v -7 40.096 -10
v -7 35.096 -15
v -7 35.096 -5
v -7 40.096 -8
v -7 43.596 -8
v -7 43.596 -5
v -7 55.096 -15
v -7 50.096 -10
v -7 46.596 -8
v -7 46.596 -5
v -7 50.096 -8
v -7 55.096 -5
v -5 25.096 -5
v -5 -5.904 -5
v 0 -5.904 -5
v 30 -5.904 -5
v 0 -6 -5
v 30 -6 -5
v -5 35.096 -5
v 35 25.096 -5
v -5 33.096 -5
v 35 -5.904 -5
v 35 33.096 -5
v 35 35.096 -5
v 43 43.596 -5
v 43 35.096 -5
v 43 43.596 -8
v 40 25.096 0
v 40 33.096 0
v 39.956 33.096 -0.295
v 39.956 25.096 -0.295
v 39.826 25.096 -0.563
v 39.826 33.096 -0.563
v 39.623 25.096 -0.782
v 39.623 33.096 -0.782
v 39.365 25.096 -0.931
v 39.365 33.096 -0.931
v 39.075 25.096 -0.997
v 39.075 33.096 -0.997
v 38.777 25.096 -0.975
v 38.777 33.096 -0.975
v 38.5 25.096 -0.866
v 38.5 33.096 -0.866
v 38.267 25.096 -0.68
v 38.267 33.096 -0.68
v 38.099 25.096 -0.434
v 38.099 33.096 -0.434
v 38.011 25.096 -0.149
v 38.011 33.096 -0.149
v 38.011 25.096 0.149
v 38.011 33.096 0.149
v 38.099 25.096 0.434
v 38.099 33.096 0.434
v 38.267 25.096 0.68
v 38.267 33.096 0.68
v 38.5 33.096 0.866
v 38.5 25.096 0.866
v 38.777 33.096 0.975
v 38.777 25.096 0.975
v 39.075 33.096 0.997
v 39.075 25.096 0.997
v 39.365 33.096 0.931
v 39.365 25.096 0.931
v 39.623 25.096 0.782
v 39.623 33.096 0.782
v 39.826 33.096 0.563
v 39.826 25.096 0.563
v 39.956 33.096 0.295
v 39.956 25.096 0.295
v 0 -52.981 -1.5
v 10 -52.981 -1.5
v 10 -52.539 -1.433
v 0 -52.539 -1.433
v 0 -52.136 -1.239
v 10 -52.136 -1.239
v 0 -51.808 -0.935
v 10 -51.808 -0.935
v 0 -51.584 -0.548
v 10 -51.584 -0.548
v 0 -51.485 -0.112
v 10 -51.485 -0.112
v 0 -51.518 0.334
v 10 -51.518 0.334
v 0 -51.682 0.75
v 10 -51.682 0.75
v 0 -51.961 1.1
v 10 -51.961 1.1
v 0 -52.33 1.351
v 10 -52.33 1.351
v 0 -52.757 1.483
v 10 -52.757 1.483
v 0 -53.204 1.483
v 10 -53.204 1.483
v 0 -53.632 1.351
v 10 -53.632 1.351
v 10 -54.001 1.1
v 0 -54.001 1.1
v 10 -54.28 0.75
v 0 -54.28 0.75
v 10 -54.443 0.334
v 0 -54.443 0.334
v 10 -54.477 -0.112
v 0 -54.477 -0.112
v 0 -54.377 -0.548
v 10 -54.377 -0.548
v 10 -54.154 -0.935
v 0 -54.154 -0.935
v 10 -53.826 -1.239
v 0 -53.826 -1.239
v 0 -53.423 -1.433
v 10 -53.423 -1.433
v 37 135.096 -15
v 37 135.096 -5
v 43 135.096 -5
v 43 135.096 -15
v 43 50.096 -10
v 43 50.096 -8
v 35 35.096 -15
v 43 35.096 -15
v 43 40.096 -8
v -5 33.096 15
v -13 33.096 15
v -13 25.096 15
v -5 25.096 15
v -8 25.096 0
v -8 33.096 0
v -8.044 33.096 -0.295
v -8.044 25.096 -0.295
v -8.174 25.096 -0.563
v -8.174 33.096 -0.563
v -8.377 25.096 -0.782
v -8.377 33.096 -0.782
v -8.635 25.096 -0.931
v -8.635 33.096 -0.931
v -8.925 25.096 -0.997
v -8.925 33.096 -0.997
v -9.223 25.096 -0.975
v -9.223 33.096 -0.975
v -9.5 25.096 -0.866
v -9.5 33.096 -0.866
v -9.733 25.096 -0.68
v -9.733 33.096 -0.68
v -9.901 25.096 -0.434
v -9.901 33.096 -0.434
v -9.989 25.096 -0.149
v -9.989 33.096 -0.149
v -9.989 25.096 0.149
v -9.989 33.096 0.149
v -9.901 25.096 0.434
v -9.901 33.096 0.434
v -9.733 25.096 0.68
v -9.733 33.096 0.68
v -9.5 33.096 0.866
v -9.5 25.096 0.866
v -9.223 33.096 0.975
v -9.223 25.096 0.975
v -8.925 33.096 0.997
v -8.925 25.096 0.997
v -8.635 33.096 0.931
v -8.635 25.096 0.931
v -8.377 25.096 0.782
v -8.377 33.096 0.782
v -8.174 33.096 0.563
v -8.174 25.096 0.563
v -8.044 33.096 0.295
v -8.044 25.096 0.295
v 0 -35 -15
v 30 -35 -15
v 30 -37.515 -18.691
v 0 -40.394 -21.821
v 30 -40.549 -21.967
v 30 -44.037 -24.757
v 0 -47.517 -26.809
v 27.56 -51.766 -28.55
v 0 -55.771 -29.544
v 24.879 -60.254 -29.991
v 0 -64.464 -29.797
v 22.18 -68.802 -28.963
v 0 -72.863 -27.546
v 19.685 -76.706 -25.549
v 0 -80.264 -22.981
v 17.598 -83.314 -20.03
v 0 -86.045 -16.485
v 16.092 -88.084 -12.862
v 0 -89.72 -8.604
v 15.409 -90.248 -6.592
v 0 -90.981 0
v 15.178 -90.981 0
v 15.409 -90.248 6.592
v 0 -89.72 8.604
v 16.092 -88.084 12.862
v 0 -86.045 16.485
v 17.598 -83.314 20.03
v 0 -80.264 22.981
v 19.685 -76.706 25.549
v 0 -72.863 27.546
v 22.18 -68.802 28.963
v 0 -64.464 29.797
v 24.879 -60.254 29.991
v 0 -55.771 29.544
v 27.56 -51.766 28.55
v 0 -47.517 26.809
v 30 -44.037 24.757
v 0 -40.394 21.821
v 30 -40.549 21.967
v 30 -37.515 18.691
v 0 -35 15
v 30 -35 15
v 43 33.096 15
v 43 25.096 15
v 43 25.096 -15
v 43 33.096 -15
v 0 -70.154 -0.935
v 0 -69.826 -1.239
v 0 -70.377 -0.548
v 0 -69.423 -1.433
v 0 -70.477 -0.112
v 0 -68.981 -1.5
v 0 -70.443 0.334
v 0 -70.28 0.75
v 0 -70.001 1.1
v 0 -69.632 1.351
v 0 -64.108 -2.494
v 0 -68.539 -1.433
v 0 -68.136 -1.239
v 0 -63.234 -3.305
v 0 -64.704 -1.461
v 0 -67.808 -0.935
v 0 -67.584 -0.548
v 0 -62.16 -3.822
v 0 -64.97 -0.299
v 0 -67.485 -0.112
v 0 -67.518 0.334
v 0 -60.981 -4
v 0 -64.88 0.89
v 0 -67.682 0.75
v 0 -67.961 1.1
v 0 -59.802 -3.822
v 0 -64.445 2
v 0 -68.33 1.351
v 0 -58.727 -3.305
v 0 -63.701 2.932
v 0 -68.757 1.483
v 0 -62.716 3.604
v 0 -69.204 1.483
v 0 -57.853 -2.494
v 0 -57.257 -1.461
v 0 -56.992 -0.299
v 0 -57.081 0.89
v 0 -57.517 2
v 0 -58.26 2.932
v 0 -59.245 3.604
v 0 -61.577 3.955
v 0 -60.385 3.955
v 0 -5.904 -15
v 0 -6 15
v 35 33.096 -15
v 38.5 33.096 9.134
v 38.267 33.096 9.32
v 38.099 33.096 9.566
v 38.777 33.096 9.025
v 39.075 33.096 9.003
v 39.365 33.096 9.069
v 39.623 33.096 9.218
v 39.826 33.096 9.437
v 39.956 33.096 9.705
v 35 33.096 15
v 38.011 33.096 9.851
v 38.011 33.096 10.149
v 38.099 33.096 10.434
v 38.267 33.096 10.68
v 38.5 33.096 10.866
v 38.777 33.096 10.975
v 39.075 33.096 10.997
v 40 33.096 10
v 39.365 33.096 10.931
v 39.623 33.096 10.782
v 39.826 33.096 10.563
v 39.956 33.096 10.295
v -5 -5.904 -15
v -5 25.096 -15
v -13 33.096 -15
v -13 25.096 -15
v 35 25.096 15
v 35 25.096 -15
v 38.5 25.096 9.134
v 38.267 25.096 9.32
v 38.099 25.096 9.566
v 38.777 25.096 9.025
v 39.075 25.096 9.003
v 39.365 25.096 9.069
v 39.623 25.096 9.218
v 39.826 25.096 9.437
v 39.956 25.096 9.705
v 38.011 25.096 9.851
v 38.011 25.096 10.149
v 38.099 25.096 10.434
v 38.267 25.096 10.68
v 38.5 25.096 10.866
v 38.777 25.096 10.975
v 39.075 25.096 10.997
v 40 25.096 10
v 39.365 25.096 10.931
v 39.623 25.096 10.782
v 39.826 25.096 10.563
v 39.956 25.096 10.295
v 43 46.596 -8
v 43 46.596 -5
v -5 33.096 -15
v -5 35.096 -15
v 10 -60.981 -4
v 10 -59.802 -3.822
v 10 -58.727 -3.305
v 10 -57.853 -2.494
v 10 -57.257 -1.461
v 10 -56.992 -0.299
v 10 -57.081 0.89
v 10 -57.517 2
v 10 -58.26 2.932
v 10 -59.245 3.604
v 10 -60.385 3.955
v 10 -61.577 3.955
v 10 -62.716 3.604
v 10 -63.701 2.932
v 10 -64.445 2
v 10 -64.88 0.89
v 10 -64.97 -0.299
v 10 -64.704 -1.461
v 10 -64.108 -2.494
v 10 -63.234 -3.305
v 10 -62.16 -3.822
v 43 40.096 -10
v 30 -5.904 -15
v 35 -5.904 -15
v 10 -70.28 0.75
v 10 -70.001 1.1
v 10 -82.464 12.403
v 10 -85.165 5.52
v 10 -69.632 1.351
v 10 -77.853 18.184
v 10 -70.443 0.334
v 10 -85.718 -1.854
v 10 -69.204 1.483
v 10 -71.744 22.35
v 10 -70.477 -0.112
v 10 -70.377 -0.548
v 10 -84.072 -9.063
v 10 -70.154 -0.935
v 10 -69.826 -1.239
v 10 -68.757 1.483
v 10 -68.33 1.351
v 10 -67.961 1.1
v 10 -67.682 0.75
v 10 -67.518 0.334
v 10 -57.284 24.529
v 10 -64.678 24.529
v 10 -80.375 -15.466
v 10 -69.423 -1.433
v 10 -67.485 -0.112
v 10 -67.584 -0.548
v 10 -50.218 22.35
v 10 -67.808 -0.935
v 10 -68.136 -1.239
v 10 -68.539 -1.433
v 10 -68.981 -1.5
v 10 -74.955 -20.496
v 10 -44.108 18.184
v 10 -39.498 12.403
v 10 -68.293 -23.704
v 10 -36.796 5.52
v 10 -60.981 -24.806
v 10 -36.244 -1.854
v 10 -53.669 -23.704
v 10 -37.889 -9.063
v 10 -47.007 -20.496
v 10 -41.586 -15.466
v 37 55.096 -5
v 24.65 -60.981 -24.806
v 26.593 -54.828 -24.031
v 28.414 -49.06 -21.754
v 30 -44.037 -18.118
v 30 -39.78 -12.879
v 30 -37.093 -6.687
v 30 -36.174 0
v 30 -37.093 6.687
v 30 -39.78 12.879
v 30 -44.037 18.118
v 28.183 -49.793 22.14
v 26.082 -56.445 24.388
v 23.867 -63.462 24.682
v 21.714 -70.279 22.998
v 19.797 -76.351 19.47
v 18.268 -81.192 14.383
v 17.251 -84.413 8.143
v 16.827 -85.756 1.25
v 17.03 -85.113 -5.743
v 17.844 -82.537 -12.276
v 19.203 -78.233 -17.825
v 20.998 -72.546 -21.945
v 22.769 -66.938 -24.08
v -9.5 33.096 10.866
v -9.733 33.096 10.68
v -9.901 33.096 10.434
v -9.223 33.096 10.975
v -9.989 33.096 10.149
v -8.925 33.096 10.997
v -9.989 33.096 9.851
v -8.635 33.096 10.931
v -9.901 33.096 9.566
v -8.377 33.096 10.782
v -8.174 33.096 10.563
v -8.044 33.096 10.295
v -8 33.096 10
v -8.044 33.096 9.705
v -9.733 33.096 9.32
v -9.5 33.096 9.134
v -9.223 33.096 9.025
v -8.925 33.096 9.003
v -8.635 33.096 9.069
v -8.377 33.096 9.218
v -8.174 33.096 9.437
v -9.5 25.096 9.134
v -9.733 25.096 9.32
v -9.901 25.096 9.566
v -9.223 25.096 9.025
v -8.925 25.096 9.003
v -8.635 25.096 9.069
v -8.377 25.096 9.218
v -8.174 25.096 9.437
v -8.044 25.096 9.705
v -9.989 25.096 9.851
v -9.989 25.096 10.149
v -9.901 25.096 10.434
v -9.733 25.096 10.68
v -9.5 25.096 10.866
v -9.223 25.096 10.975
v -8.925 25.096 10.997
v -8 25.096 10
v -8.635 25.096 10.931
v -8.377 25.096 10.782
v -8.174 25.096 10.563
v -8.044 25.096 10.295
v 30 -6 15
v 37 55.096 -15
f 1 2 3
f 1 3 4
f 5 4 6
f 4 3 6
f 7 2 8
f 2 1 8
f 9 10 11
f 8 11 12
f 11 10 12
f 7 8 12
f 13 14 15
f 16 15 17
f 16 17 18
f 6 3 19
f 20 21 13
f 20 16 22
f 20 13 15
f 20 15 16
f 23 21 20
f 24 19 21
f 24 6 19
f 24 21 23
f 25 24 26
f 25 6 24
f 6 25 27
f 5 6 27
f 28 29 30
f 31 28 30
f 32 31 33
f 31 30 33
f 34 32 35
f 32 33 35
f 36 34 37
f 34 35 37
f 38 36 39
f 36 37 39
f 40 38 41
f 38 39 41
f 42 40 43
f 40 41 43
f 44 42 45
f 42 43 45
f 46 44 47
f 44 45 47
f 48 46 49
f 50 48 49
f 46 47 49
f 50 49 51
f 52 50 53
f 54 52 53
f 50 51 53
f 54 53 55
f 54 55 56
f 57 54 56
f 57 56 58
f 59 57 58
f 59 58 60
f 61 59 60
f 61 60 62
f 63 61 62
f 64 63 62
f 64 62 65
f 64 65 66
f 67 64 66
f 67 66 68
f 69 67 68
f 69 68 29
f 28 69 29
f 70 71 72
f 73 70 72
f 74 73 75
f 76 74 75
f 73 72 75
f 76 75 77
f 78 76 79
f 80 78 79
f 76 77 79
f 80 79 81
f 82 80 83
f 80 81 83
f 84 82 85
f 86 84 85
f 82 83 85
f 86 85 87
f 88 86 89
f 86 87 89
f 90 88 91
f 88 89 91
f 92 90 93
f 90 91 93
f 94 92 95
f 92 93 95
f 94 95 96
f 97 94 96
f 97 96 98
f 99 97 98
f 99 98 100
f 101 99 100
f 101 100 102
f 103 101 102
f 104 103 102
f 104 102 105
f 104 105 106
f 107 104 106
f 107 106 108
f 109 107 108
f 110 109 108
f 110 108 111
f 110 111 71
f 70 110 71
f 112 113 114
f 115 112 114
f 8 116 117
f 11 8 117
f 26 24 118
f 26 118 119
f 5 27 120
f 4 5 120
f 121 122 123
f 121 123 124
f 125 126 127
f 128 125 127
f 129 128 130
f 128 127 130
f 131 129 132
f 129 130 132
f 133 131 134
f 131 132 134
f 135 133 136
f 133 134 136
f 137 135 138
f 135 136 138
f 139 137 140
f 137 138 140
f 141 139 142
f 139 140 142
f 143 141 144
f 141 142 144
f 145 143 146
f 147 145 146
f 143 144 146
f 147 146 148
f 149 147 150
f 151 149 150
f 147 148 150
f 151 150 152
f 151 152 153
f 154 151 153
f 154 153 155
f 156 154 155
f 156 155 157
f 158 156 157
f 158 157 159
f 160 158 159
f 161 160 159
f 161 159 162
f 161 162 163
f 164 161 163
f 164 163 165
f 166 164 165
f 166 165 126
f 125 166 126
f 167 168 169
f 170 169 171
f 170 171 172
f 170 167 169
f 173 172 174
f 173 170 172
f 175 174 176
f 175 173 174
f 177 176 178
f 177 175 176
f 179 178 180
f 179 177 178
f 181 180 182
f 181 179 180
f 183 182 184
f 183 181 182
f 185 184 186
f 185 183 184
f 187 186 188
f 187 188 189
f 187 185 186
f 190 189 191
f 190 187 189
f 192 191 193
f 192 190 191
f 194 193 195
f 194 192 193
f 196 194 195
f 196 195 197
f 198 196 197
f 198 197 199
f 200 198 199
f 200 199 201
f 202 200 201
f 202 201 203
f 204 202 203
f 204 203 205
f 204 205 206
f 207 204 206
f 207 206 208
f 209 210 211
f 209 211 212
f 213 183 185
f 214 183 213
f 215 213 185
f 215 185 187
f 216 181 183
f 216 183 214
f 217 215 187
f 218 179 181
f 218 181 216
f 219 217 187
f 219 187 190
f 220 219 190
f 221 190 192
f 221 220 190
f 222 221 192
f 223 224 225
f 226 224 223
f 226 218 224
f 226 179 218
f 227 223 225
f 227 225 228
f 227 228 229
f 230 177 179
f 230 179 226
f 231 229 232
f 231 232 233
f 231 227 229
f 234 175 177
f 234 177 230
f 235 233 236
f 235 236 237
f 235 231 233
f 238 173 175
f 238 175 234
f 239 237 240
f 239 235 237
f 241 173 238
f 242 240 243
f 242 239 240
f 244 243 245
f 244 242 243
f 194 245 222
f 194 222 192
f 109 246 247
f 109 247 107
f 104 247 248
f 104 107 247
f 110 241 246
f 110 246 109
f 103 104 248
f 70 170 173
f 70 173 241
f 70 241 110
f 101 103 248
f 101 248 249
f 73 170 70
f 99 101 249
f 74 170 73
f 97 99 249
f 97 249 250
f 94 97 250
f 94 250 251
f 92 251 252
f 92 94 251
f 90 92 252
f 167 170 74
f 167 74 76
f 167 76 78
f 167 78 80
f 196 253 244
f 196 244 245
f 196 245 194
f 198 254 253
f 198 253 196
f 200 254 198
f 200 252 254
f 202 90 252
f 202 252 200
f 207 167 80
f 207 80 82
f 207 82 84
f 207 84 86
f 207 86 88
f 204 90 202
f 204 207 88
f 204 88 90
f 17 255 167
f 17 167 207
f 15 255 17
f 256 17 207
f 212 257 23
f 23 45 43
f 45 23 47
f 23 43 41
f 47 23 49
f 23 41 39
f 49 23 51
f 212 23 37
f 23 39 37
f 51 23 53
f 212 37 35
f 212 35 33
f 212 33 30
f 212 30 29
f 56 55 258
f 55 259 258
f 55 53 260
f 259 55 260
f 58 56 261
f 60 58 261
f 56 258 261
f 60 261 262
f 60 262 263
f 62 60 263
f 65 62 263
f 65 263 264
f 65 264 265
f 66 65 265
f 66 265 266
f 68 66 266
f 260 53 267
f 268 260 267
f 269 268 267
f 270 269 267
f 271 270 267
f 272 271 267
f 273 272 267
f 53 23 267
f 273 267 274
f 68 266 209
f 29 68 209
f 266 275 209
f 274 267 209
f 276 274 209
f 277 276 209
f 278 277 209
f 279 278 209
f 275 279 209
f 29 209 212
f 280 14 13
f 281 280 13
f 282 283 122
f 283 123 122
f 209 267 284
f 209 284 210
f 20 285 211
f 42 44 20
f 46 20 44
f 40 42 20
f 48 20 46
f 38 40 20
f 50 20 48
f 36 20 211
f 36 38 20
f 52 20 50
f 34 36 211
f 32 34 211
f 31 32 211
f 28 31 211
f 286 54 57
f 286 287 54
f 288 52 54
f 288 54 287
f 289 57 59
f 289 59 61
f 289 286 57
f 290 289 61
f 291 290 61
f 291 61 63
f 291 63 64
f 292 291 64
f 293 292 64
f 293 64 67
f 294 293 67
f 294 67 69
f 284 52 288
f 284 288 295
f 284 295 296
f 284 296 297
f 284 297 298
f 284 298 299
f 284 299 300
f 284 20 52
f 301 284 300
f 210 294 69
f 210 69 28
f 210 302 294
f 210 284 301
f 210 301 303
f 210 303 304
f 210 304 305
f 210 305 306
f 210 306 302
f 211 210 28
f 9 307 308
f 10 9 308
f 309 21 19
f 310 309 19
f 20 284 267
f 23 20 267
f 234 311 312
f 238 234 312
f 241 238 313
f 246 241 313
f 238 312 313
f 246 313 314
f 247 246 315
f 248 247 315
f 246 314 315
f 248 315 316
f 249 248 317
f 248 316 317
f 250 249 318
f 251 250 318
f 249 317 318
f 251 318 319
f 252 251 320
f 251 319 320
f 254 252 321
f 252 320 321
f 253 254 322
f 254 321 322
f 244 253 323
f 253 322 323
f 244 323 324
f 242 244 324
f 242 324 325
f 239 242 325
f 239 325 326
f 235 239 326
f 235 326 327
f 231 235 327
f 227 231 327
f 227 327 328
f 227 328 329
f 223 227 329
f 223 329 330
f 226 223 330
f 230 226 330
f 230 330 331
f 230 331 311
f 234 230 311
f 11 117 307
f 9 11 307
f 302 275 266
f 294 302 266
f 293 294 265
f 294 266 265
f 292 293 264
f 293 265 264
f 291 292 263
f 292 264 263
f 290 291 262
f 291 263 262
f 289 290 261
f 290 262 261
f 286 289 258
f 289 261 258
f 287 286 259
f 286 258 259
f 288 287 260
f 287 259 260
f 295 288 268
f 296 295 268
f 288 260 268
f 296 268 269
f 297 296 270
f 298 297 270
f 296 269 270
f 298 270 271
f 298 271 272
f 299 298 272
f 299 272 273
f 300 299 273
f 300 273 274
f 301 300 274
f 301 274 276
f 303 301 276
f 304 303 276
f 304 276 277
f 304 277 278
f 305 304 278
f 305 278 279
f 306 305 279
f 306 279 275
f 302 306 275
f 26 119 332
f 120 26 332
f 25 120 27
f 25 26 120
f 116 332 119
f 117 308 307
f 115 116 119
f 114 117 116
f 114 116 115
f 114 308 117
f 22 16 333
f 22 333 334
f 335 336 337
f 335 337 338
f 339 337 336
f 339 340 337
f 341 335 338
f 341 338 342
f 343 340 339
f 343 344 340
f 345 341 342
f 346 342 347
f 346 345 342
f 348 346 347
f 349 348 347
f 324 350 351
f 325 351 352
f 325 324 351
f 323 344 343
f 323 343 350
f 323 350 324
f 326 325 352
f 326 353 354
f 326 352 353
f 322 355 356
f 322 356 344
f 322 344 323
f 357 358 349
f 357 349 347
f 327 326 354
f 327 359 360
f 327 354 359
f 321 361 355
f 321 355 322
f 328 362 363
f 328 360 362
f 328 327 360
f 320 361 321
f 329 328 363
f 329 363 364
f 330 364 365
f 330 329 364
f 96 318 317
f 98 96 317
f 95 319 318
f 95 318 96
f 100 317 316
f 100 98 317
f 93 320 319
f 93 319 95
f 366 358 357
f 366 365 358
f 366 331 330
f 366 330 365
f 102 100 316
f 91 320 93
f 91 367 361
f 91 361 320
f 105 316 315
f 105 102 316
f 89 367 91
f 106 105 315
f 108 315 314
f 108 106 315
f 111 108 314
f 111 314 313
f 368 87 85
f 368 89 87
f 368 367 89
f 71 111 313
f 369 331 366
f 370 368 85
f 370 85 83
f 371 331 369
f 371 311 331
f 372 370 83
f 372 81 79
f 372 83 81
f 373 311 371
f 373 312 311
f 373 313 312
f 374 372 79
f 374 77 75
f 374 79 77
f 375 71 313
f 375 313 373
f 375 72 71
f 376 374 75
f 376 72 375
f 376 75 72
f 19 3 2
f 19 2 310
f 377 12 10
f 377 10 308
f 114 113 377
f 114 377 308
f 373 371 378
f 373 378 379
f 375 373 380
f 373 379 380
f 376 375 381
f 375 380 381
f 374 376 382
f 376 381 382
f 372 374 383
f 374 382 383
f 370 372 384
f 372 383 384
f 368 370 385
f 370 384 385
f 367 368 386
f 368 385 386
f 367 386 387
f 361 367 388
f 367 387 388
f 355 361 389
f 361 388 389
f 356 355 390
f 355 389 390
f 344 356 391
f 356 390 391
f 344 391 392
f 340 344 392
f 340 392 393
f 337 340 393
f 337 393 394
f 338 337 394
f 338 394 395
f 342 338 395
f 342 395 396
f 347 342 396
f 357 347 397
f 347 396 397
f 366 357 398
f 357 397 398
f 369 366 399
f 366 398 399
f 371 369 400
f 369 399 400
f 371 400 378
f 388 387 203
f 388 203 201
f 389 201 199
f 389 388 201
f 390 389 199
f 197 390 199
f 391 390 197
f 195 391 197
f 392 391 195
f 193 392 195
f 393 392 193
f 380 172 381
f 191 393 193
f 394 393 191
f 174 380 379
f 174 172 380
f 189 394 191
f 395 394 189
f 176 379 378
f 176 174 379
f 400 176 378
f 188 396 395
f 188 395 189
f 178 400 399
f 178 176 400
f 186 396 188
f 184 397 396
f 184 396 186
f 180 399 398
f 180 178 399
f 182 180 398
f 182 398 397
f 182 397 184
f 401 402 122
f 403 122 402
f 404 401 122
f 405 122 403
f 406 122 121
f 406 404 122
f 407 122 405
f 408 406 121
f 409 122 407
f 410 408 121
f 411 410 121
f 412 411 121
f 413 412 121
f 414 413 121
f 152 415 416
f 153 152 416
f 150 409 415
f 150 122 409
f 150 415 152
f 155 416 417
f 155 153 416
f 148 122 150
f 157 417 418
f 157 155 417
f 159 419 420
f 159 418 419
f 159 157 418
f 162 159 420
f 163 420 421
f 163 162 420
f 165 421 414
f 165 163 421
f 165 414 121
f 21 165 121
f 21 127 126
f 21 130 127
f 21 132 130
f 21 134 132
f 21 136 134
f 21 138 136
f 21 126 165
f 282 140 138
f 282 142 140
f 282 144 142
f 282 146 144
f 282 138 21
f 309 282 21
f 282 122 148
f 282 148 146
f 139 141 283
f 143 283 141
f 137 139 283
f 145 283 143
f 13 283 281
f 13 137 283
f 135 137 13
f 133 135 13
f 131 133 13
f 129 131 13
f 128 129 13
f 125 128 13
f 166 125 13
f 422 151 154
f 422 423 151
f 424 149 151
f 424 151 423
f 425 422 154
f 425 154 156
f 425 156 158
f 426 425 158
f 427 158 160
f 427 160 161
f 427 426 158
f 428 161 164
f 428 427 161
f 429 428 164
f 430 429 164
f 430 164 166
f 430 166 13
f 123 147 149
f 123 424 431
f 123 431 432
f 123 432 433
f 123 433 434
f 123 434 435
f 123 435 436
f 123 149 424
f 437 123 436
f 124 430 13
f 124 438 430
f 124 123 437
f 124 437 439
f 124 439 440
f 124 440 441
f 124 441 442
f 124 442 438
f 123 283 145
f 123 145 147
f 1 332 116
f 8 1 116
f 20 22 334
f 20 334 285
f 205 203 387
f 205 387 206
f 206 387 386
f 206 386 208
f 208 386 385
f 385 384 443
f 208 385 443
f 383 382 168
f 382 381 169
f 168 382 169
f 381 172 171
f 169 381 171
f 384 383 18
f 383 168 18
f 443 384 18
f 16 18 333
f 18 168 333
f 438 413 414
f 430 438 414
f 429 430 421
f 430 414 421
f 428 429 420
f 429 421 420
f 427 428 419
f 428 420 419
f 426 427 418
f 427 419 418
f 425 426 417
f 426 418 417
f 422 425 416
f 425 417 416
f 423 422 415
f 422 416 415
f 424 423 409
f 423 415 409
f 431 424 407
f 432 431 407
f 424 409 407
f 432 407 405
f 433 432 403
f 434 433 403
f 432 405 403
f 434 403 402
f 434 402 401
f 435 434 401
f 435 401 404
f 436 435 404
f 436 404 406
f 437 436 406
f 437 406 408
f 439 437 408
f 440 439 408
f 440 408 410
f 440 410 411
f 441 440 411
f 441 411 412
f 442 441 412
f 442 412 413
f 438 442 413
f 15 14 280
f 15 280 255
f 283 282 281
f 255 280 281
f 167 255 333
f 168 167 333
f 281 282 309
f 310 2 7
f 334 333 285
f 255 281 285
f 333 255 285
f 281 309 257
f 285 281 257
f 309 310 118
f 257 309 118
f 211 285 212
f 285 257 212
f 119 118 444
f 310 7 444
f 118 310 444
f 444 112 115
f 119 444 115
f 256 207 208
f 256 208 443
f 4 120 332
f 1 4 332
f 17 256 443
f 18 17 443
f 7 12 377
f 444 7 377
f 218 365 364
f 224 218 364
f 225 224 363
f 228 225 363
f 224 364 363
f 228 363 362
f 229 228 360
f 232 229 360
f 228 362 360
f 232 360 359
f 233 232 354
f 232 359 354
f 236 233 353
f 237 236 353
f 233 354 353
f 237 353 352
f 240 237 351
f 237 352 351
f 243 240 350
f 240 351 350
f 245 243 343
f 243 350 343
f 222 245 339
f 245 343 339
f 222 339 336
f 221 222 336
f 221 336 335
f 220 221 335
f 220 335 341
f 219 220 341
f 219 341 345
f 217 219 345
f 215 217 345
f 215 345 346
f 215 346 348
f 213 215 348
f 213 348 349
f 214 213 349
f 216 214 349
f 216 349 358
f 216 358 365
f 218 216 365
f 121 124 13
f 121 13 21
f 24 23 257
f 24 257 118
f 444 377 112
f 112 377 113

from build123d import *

# Parameters (mm, degrees)
BOSS_EXTRUDE1_DEPTH      = 30
CUT_EXTRUDE4_DEPTH       = 40
CUT_EXTRUDE4_DEPTH_BACK  = 40
BOSS_EXTRUDE2_DEPTH      = 15
BOSS_EXTRUDE2_DEPTH_BACK = 15
SKETCH7_W                = 30
SKETCH7_H                = 66.933951842
SKETCH12_W               = 30
SKETCH12_H               = 41
CUT_EXTRUDE7_DEPTH       = 20
SKETCH13_W               = 40
SKETCH13_H               = 41
BOSS_EXTRUDE4_DEPTH      = 10
BOSS_EXTRUDE5_DEPTH      = 20
BOSS_EXTRUDE5_DEPTH_BACK = 10
SKETCH15_W               = 8
SKETCH15_H               = 8
SKETCH17_R               = 1
CUT_EXTRUDE9_DEPTH       = 30
SKETCH18_R               = 24.806306278
CUT_EXTRUDE10_DEPTH      = 20
SKETCH19_R               = 4
SKETCH19_R_2             = 1.5
CUT_EXTRUDE11_DEPTH      = 30
SKETCH20_W               = 56
SKETCH20_H               = 100
BOSS_EXTRUDE6_DEPTH      = 10
SKETCH24_W               = 50
SKETCH24_H               = 80
CUT_EXTRUDE13_DEPTH      = 20
CUT_EXTRUDE14_DEPTH      = 70
SKETCH30_W               = 6
SKETCH30_H               = 20
CUT_EXTRUDE15_DEPTH      = 30


with BuildPart() as part:
    # Sketch2 → Boss-Extrude1 (new body)
    with BuildSketch(Plane(origin=(0, 0, 0), x_dir=(0, 0, -1), z_dir=(1, 0, 0))):
        with BuildLine():
            Line((-15, 35), (15, 35))
            Line((15, 35), (15, -35))
            ThreePointArc((15, -35), (0, -90.980762114), (-15, -35))
            Line((-15, -35), (-15, 35))
        make_face()
    extrude(amount=BOSS_EXTRUDE1_DEPTH)

    # Sketch6 → Cut-Extrude4 (cut, two sides: drawn at the far end of the back side and taken through both)
    with BuildSketch(Plane.XY.offset(-CUT_EXTRUDE4_DEPTH_BACK)):
        Polygon((15, 35), (30, -15.145060683), (30, -44.036502572), (15, -91.543130052), (48.566296189, -91.543130052), (48.566296189, 35), align=None)
    extrude(amount=CUT_EXTRUDE4_DEPTH + CUT_EXTRUDE4_DEPTH_BACK, mode=Mode.SUBTRACT)

    # Sketch7 → Boss-Extrude2 (add, two sides: drawn at the far end of the back side and taken through both)
    with BuildSketch(Plane.XY.offset(-BOSS_EXTRUDE2_DEPTH_BACK)):
        with Locations((15, 1.533024079)):
            Rectangle(SKETCH7_W, SKETCH7_H)
    extrude(amount=BOSS_EXTRUDE2_DEPTH + BOSS_EXTRUDE2_DEPTH_BACK)

    # Sketch12 → Cut-Extrude7 (cut)
    with BuildSketch(Plane.XY.offset(15)):
        with Locations((15, 14.5)):
            Rectangle(SKETCH12_W, SKETCH12_H)
    extrude(amount=-CUT_EXTRUDE7_DEPTH, mode=Mode.SUBTRACT)

    # Sketch13 → Boss-Extrude4 (add)
    with BuildSketch(Plane.XY.offset(-5)):
        with Locations((15, 14.596252504)):
            Rectangle(SKETCH13_W, SKETCH13_H)
    extrude(amount=-BOSS_EXTRUDE4_DEPTH)

    # Sketch15 → Boss-Extrude5 (add, two sides: drawn at the far end of the back side and taken through both)
    with BuildSketch(Plane.XY.offset(-5).offset(-BOSS_EXTRUDE5_DEPTH_BACK)):
        with Locations((39, 29.096252504)):
            Rectangle(SKETCH15_W, SKETCH15_H)
        with Locations((-9, 29.096252504)):
            Rectangle(SKETCH15_W, SKETCH15_H)
    extrude(amount=BOSS_EXTRUDE5_DEPTH + BOSS_EXTRUDE5_DEPTH_BACK)

    # Sketch17 → Cut-Extrude9 (cut)
    with BuildSketch(Plane(origin=(0, 33.096252504, 0), x_dir=(1, 0, 0), z_dir=(0, 1, 0))):
        with Locations((39, 0)):
            Circle(SKETCH17_R)
        with Locations((39, -10)):
            Circle(SKETCH17_R)
        with Locations((-9, 0)):
            Circle(SKETCH17_R)
        with Locations((-9, -10)):
            Circle(SKETCH17_R)
    extrude(amount=-CUT_EXTRUDE9_DEPTH, mode=Mode.SUBTRACT)

    # Sketch18 → Cut-Extrude10 (cut)
    with BuildSketch(Plane(origin=(30, 0, 0), x_dir=(0, 0, -1), z_dir=(1, 0, 0))):
        with Locations((0, -60.980762114)):
            Circle(SKETCH18_R)
    extrude(amount=-CUT_EXTRUDE10_DEPTH, mode=Mode.SUBTRACT)

    # Sketch19 → Cut-Extrude11 (cut)
    with BuildSketch(Plane(origin=(30, 0, 0), x_dir=(0, 0, -1), z_dir=(1, 0, 0))):
        with Locations((0, -60.980762114)):
            Circle(SKETCH19_R)
        with Locations((0, -52.980762114)):
            Circle(SKETCH19_R_2)
        with Locations((0, -68.980762114)):
            Circle(SKETCH19_R_2)
    extrude(amount=-CUT_EXTRUDE11_DEPTH, mode=Mode.SUBTRACT)

    # Sketch20 → Boss-Extrude6 (add)
    with BuildSketch(Plane.XY.offset(-5)):
        with Locations((15, 85.096252504)):
            Rectangle(SKETCH20_W, SKETCH20_H)
    extrude(amount=-BOSS_EXTRUDE6_DEPTH)

    # Sketch24 → Cut-Extrude13 (cut)
    with BuildSketch(Plane.XY.offset(-5)):
        with Locations((12, 95.096252504)):
            Rectangle(SKETCH24_W, SKETCH24_H)
    extrude(amount=-CUT_EXTRUDE13_DEPTH, mode=Mode.SUBTRACT)

    # Sketch25 → Cut-Extrude14 (cut)
    with BuildSketch(Plane(origin=(43, 0, 0), x_dir=(0, 0, -1), z_dir=(1, 0, 0))):
        Polygon((10, 50.096252504), (8, 50.096252504), (8, 46.596252504), (3.330307532, 46.596252504), (3.330307532, 43.596252504), (8, 43.596252504), (8, 40.096252504), (10, 40.096252504), align=None)
    extrude(amount=-CUT_EXTRUDE14_DEPTH, mode=Mode.SUBTRACT)

    # Sketch30 → Cut-Extrude15 (cut)
    with BuildSketch(Plane.XY.offset(-5)):
        with Locations((-10, 45.096252504)):
            Rectangle(SKETCH30_W, SKETCH30_H)
    extrude(amount=-CUT_EXTRUDE15_DEPTH, mode=Mode.SUBTRACT)


solid = part.part
